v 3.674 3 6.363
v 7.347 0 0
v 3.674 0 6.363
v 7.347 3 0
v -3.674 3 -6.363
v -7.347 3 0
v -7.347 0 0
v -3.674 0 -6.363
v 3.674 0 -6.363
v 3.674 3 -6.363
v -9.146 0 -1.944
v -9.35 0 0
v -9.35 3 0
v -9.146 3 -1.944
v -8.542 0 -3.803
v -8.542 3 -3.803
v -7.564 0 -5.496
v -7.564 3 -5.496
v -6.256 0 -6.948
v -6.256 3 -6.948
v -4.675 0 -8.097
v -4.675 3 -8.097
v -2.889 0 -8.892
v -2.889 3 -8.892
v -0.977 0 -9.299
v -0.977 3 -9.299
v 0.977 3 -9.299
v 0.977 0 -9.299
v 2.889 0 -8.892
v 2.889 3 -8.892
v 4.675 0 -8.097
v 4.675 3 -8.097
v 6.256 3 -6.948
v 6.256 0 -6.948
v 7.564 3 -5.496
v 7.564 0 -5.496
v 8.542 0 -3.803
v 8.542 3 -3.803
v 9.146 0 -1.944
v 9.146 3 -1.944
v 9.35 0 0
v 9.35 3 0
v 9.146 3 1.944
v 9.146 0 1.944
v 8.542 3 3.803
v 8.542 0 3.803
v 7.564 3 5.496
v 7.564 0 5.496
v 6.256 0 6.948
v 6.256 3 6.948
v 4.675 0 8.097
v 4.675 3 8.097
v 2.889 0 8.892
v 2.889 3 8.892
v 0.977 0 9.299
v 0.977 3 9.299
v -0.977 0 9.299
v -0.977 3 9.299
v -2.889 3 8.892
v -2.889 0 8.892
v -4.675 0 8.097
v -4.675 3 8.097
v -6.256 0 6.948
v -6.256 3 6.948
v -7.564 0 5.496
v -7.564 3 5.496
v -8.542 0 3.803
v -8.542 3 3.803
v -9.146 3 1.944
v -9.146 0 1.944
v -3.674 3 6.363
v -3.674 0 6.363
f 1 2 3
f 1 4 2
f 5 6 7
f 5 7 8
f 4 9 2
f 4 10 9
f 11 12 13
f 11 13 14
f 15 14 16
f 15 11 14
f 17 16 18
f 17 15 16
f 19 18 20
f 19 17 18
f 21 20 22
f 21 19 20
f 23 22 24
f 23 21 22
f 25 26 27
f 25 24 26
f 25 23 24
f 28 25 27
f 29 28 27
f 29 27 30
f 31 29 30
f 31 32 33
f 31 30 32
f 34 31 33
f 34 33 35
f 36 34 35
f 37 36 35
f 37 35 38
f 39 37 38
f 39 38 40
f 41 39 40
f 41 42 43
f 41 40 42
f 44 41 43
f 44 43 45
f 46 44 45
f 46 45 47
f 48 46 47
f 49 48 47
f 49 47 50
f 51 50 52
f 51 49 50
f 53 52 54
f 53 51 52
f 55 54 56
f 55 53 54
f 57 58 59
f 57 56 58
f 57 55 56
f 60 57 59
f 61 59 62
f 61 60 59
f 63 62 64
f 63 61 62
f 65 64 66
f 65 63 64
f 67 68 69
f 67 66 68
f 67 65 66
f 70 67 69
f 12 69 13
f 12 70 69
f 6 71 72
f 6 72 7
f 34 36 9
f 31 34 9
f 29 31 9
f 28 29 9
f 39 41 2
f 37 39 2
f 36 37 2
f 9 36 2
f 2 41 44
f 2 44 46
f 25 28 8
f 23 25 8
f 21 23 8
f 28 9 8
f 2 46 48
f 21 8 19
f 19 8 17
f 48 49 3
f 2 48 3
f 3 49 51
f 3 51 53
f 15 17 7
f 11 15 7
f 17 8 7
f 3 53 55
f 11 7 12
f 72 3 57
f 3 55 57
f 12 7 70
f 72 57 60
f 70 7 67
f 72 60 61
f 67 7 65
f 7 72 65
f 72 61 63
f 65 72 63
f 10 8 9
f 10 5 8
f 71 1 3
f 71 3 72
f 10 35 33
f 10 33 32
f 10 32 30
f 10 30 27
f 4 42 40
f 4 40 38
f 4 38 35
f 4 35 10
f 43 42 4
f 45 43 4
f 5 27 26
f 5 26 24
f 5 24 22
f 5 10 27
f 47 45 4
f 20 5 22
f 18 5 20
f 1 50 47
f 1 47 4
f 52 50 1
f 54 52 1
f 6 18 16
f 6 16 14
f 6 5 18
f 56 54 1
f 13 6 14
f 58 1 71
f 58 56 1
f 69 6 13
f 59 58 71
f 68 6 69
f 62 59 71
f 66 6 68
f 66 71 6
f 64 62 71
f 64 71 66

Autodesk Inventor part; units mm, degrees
ref_plane "YZ Plane" through (0, 0, 0) normal (1, 0, 0) x (0, 1, 0)
ref_plane "XZ Plane" through (0, 0, 0) normal (0, 1, 0) x (-1, 0, 0)
ref_plane "XY Plane" through (0, 0, 0) normal (0, 0, 1) x (1, 0, 0)
sketch "Sketch1" plane through (0, 0, 0) normal (0, 1, 0) x (-1, 0, 0)
  line L0 (-6.35, -3.6662) -> (-6.35, 3.6662)
  line L1 (-6.35, 3.6662) -> (0, 7.3323)
  line L2 (0, 7.3323) -> (6.35, 3.6662)
  line L3 (6.35, 3.6662) -> (6.35, -3.6662)
  line L4 (6.35, -3.6662) -> (0, -7.3323)
  line L5 (0, -7.3323) -> (-6.35, -3.6662)
  circle A0 centre (0, 0) radius 6.35
  circle A1 centre (0, 0) radius 9.35
  dimension "d0" = 12.7
  dimension "d1" = 3
extrude "Extrusion1" add sketch "Sketch1" along normal blind 3 contours L0 A0 L5 | L0 L1 A0 | A0 | A0 L4 L5 | L1 L2 A0 | A0 L3 L4 | L2 L3 A0 | A1
sketch "Sketch2" plane through (0, 3, 0) normal (0, 1, 0) x (1, 0, 0)
  line L0 (-7.347, 0) -> (-3.6735, 6.3627)
  line L1 (-3.6735, 6.3627) -> (3.6735, 6.3627)
  line L2 (3.6735, 6.3627) -> (7.347, 0)
  line L3 (7.347, 0) -> (3.6735, -6.3627)
  line L4 (3.6735, -6.3627) -> (-3.6735, -6.3627)
  line L5 (-3.6735, -6.3627) -> (-7.347, 0)
  point P0 (0, 0)
  point P1 (0, 0)
  dimension "d4" = 12.7254
extrude "Extrusion2" cut sketch "Sketch2" against normal blind 3
properties part number "3mmHEXSPACER"
